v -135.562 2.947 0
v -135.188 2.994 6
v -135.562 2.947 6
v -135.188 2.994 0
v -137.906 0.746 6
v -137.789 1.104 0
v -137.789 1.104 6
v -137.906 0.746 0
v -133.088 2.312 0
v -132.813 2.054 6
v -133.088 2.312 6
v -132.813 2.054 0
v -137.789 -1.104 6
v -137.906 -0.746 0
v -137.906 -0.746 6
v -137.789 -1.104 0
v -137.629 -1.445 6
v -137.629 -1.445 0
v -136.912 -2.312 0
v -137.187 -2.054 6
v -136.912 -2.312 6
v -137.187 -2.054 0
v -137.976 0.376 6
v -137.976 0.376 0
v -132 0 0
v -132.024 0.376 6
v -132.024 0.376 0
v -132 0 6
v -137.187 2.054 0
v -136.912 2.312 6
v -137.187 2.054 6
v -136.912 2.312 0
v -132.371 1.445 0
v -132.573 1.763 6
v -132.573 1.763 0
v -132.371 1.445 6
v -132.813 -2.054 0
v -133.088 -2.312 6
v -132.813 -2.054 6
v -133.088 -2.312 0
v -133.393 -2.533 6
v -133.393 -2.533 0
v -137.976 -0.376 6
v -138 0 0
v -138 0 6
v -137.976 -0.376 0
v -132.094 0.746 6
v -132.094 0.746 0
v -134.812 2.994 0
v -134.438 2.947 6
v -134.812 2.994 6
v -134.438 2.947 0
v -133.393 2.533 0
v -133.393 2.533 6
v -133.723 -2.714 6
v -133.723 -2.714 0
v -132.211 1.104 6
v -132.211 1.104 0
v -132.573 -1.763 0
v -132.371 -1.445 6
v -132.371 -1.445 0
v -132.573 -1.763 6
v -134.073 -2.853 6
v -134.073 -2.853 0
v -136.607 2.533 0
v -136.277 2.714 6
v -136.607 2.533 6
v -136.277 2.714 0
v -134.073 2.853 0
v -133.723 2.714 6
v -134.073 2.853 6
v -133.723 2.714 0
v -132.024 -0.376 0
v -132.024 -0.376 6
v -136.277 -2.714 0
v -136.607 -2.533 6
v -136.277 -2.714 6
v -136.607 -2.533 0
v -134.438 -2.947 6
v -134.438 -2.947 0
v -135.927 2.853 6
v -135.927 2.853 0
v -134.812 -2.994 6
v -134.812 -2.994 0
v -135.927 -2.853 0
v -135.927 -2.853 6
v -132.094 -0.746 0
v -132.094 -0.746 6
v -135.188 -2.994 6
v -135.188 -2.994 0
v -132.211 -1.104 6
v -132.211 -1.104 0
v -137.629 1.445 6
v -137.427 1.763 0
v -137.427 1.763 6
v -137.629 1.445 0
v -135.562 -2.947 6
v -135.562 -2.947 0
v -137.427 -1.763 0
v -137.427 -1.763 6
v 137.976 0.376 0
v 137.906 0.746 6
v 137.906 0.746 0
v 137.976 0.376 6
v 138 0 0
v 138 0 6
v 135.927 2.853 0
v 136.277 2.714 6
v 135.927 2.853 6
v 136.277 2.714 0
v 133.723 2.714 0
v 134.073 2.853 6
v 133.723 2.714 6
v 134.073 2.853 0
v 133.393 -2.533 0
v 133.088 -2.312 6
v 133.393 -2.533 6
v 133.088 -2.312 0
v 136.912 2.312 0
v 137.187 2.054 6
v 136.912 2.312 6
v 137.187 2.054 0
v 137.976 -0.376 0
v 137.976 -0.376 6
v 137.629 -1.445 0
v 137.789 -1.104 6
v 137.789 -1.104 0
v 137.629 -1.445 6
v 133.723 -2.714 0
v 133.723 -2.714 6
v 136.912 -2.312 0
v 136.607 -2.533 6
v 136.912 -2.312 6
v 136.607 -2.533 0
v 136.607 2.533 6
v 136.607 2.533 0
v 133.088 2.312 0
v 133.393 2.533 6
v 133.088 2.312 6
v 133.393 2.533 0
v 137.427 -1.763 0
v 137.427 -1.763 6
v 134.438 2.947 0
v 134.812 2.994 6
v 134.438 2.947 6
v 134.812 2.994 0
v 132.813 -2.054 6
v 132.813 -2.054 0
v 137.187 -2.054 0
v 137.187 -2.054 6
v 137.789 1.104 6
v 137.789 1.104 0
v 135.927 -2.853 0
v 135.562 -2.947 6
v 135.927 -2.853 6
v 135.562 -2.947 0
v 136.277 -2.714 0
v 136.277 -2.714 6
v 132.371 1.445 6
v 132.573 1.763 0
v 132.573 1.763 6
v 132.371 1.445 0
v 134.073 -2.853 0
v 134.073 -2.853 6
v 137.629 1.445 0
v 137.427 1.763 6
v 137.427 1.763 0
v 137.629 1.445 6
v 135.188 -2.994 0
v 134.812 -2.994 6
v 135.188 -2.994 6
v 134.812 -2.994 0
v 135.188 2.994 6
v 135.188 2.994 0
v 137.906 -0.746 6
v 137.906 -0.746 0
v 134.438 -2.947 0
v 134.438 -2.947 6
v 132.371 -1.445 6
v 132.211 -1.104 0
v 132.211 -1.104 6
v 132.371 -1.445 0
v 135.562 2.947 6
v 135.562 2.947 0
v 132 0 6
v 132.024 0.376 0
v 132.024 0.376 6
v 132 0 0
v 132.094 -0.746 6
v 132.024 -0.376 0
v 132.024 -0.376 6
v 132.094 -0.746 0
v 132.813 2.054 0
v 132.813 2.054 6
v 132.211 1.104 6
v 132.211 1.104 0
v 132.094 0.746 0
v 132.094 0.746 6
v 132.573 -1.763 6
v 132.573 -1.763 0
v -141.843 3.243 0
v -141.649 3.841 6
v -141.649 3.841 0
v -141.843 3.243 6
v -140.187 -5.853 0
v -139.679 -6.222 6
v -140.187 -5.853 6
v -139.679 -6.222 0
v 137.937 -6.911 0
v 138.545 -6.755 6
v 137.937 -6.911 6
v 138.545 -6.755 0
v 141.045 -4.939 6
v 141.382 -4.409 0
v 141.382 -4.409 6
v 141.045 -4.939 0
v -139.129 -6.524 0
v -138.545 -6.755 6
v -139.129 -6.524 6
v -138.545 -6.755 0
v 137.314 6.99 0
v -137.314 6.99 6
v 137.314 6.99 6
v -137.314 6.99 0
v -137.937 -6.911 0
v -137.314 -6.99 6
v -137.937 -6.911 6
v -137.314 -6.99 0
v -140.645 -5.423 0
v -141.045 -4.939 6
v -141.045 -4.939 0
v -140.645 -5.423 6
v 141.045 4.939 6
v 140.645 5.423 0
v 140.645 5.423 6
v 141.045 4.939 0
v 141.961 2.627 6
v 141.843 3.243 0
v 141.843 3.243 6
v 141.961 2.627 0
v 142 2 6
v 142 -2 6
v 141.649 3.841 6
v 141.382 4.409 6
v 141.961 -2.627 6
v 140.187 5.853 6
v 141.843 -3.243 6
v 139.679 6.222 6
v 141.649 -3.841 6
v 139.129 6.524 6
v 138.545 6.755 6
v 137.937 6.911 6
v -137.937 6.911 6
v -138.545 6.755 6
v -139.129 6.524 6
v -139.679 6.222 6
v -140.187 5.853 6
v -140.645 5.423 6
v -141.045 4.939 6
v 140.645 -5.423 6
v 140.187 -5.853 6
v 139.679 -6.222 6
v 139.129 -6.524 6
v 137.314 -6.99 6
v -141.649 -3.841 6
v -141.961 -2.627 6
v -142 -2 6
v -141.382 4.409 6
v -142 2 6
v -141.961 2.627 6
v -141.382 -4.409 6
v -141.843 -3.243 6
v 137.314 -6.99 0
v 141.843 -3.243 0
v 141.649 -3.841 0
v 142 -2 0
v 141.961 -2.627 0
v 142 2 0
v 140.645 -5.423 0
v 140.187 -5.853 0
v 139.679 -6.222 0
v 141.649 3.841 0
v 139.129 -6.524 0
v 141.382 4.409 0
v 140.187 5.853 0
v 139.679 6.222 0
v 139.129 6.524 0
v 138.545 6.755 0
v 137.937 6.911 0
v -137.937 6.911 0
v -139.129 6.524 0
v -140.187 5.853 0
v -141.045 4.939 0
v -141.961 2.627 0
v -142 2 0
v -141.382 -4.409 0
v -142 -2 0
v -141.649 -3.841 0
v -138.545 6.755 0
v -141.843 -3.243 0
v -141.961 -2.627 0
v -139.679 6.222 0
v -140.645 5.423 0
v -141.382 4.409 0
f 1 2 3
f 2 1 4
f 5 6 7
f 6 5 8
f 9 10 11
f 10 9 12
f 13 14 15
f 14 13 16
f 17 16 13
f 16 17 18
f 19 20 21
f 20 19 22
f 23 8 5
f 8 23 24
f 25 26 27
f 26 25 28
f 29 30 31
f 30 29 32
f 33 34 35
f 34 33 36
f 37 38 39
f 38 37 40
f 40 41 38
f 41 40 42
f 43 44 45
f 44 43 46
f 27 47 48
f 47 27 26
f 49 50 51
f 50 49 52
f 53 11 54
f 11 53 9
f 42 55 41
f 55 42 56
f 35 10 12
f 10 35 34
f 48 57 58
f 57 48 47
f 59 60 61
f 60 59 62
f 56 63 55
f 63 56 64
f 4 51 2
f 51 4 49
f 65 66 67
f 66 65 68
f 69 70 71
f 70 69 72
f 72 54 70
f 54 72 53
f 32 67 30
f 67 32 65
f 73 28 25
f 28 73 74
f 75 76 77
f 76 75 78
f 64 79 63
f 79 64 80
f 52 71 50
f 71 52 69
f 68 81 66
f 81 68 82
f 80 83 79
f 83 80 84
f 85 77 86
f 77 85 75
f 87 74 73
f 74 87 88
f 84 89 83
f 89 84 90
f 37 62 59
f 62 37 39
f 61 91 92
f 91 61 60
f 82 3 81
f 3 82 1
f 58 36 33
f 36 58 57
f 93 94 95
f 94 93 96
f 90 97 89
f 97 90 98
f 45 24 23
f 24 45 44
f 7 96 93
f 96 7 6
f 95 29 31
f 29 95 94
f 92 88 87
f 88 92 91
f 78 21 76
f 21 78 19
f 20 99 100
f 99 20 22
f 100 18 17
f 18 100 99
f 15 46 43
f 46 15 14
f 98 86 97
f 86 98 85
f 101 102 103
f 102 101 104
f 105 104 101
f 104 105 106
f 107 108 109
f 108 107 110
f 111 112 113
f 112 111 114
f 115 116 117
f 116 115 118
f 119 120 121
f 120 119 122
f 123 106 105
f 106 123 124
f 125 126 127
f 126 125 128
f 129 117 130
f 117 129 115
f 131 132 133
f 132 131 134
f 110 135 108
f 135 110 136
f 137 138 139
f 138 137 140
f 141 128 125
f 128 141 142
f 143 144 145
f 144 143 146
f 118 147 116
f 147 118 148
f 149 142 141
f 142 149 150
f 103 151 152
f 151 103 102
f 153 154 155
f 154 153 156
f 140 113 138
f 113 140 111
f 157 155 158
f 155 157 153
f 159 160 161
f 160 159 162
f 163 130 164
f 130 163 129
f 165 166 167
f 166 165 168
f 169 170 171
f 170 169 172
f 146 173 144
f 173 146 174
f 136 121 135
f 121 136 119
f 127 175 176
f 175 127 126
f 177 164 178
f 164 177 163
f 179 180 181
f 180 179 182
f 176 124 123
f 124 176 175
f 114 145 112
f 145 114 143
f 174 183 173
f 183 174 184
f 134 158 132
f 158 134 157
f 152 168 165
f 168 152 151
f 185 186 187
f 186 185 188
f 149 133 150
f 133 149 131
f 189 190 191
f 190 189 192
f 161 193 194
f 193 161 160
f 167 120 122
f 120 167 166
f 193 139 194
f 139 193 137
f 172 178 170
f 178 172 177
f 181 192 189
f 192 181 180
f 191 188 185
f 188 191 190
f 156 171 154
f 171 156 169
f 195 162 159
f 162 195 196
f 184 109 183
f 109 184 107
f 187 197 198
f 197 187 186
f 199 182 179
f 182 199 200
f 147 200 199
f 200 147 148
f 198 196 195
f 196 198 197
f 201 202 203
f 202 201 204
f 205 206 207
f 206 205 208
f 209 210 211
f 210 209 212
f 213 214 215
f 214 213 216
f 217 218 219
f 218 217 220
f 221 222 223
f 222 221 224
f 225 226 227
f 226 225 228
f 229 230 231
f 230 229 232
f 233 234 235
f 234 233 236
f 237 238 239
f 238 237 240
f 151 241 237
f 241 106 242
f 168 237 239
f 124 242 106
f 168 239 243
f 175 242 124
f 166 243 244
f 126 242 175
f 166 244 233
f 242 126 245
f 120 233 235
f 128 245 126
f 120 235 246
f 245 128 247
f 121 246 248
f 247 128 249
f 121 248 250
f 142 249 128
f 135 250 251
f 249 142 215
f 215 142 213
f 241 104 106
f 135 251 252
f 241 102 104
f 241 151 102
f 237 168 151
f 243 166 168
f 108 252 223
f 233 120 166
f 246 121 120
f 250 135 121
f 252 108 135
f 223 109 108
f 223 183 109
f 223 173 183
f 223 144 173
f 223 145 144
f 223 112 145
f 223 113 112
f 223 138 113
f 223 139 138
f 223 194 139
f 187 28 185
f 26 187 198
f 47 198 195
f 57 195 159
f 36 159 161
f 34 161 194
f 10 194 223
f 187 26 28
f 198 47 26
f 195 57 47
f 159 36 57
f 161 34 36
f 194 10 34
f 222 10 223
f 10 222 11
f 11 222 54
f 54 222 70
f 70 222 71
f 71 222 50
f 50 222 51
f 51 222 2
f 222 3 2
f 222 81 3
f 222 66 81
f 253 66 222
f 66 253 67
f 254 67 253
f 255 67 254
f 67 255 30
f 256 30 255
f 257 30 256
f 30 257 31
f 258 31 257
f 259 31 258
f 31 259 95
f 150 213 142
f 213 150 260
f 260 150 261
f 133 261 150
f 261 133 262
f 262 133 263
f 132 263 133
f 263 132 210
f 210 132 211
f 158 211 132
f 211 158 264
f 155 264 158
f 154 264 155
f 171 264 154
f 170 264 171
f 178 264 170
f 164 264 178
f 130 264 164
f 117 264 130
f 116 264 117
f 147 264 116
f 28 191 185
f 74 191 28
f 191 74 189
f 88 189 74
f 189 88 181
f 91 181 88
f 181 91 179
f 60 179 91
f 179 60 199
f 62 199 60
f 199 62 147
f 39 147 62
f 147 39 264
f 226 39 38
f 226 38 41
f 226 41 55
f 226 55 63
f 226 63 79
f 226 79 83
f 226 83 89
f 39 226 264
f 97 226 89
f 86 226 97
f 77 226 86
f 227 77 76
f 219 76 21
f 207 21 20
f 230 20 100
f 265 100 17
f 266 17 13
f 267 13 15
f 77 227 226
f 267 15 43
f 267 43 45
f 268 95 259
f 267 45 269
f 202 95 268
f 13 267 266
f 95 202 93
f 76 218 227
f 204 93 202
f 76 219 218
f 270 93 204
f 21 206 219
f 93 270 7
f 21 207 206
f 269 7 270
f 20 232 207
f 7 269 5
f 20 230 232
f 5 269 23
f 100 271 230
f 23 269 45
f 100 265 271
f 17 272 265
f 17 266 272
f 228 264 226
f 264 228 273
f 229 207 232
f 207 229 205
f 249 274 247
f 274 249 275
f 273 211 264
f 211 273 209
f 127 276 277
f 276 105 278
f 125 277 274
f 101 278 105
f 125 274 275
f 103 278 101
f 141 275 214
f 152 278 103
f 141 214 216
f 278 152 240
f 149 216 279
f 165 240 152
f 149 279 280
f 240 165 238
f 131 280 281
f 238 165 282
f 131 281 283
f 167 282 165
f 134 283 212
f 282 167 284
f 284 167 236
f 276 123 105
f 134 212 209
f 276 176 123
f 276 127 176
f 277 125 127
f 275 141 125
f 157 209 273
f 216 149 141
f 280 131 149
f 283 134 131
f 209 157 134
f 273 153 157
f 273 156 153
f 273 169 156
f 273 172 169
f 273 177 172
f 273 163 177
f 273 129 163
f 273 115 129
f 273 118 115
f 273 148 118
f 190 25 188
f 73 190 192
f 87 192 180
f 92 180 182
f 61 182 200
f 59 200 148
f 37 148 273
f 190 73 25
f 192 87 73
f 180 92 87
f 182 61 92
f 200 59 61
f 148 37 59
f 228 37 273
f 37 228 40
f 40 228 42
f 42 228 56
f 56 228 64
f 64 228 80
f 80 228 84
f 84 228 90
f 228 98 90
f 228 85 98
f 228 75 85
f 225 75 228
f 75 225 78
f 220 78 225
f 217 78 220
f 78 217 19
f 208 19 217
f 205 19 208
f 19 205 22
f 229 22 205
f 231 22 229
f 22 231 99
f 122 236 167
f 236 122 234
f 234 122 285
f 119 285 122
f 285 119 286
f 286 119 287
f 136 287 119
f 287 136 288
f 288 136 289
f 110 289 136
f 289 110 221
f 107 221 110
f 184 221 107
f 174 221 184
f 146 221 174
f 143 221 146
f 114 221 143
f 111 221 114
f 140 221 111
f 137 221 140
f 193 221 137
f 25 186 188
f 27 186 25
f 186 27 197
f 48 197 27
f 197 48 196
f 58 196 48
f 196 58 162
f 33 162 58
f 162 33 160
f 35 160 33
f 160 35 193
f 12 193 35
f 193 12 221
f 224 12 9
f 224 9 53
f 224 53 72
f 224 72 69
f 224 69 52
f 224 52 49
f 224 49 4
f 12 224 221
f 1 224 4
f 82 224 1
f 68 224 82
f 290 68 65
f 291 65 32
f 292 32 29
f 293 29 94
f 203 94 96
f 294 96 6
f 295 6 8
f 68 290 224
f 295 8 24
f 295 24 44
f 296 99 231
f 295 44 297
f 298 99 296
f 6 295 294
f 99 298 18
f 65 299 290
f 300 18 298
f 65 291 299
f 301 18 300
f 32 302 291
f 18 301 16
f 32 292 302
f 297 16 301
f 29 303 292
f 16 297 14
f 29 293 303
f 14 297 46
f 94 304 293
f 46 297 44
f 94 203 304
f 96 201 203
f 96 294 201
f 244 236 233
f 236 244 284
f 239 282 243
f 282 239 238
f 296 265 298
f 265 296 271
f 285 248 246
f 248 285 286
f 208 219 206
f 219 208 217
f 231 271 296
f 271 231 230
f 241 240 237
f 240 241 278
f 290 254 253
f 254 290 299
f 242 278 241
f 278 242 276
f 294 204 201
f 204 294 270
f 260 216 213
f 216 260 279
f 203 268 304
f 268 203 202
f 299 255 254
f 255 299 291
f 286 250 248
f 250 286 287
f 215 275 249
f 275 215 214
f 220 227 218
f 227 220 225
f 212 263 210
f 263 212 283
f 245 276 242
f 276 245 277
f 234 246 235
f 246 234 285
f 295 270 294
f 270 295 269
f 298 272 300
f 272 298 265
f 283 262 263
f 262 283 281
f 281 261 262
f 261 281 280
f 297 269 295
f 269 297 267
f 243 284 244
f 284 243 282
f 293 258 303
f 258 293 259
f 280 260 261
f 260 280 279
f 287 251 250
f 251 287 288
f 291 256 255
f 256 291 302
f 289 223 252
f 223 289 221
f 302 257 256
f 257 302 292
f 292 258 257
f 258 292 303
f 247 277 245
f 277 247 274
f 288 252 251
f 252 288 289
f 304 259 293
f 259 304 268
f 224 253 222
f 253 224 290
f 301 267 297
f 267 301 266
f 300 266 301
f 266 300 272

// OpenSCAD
$fn = 50;


difference() {
	union() {
		hull() {
			translate(v = [-137.0000000000, 2.0000000000, 0]) {
				cylinder(h = 6, r = 5);
			}
			translate(v = [137.0000000000, 2.0000000000, 0]) {
				cylinder(h = 6, r = 5);
			}
			translate(v = [-137.0000000000, -2.0000000000, 0]) {
				cylinder(h = 6, r = 5);
			}
			translate(v = [137.0000000000, -2.0000000000, 0]) {
				cylinder(h = 6, r = 5);
			}
		}
	}
	union() {
		translate(v = [-135.0000000000, 0.0000000000, -100.0000000000]) {
			cylinder(h = 200, r = 3.0000000000);
		}
		translate(v = [-135.0000000000, 0.0000000000, -100.0000000000]) {
			cylinder(h = 200, r = 3.0000000000);
		}
		translate(v = [135.0000000000, 0.0000000000, -100.0000000000]) {
			cylinder(h = 200, r = 3.0000000000);
		}
		translate(v = [135.0000000000, 0.0000000000, -100.0000000000]) {
			cylinder(h = 200, r = 3.0000000000);
		}
	}
}
